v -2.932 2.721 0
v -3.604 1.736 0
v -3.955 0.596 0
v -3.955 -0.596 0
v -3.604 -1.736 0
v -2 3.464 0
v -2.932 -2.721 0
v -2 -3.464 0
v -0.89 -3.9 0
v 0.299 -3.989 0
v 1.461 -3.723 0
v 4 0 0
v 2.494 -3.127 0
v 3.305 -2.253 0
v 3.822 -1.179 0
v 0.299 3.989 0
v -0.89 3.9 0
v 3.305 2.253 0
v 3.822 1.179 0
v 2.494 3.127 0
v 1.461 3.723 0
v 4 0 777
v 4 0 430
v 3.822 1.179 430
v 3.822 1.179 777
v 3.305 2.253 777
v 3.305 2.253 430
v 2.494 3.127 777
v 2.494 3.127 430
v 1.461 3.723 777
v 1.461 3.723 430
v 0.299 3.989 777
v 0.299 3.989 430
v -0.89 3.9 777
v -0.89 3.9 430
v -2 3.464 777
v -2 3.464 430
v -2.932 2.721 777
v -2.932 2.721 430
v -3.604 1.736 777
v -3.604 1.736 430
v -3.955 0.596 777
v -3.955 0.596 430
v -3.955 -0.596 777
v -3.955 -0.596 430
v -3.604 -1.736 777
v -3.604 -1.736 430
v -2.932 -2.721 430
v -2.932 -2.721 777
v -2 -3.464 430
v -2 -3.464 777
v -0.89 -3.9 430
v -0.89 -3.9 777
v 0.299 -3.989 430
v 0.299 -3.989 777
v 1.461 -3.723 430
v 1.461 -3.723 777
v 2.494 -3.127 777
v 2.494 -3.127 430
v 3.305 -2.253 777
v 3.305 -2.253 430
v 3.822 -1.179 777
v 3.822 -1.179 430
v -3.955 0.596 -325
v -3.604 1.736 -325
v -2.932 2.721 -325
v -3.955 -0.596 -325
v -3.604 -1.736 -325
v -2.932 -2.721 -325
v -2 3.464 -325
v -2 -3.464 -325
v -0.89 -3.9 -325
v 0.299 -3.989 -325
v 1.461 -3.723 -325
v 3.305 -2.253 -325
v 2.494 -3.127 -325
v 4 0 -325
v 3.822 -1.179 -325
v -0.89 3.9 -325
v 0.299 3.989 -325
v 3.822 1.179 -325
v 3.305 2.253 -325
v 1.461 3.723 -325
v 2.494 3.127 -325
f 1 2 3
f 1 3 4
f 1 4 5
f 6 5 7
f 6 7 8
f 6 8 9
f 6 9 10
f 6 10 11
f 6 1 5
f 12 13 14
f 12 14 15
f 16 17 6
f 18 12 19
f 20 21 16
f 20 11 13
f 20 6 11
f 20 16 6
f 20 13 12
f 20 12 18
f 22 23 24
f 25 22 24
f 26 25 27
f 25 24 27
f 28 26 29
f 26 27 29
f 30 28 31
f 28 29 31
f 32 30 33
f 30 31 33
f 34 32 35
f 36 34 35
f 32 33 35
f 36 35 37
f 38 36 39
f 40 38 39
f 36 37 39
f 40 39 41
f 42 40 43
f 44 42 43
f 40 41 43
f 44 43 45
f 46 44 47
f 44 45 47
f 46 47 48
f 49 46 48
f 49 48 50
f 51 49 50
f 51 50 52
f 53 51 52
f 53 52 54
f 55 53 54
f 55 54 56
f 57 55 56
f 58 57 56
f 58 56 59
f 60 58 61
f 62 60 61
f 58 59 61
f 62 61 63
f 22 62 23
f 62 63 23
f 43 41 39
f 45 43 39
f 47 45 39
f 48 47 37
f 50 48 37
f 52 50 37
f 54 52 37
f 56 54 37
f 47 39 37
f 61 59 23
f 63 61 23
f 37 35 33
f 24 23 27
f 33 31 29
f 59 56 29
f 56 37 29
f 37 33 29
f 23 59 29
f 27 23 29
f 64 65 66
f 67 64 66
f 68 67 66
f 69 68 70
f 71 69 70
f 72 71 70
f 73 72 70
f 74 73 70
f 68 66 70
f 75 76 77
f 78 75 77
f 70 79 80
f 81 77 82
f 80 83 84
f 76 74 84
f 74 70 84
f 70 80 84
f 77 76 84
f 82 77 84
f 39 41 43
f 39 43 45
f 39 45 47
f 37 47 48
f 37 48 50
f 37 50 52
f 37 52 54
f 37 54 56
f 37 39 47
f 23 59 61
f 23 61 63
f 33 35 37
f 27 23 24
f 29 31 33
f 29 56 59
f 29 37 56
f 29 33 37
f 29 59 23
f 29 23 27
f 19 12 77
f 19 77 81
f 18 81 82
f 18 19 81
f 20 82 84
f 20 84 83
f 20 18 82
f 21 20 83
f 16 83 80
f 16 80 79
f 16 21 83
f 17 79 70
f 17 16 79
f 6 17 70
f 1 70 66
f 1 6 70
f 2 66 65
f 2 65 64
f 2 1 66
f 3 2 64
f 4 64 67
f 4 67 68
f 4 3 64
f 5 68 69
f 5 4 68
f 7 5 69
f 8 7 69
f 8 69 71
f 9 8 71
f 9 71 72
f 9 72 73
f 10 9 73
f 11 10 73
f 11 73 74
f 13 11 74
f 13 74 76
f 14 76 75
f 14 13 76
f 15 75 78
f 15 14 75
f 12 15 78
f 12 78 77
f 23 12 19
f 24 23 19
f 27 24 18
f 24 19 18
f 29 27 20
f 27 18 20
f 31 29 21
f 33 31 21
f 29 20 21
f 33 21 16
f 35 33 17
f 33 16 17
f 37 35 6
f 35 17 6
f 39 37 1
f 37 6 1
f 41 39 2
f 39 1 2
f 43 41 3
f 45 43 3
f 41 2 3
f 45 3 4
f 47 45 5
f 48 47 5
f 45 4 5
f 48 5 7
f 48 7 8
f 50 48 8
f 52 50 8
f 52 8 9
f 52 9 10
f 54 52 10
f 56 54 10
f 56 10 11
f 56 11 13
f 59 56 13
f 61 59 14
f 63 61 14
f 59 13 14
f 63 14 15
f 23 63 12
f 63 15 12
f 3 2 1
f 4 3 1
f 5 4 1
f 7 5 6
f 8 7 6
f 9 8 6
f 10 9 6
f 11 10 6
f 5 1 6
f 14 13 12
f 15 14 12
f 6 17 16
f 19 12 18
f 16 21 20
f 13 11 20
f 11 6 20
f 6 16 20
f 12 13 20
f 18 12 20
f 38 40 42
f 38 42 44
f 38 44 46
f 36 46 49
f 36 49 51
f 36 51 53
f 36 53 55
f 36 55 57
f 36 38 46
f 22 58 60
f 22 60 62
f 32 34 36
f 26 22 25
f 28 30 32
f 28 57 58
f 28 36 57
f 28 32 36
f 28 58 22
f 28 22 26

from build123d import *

# Parameters (mm, degrees)
F0_R     = 4
F1_DEPTH = 430
F2_DEPTH = 347
F3_DEPTH = 325


with BuildPart() as f1:
    # F0 (on Top) → F1 (new body)
    with BuildSketch(Plane.XY):
        Circle(F0_R)
    extrude(amount=F1_DEPTH)


with BuildPart() as f2:
    # F2 (new): a face of the model
    f2_faces = [f1.part.faces().sort_by_distance(p)[0] for p in [
        (0, 0, 430),
    ]]
    extrude(f2_faces, amount=F2_DEPTH)


with BuildPart() as f3:
    # F3 (new): a face of the model
    f3_faces = [f1.part.faces().sort_by_distance(p)[0] for p in [
        (0, 0, 0),
    ]]
    extrude(f3_faces, amount=F3_DEPTH)


solid = Compound([f1.part, f2.part, f3.part])
